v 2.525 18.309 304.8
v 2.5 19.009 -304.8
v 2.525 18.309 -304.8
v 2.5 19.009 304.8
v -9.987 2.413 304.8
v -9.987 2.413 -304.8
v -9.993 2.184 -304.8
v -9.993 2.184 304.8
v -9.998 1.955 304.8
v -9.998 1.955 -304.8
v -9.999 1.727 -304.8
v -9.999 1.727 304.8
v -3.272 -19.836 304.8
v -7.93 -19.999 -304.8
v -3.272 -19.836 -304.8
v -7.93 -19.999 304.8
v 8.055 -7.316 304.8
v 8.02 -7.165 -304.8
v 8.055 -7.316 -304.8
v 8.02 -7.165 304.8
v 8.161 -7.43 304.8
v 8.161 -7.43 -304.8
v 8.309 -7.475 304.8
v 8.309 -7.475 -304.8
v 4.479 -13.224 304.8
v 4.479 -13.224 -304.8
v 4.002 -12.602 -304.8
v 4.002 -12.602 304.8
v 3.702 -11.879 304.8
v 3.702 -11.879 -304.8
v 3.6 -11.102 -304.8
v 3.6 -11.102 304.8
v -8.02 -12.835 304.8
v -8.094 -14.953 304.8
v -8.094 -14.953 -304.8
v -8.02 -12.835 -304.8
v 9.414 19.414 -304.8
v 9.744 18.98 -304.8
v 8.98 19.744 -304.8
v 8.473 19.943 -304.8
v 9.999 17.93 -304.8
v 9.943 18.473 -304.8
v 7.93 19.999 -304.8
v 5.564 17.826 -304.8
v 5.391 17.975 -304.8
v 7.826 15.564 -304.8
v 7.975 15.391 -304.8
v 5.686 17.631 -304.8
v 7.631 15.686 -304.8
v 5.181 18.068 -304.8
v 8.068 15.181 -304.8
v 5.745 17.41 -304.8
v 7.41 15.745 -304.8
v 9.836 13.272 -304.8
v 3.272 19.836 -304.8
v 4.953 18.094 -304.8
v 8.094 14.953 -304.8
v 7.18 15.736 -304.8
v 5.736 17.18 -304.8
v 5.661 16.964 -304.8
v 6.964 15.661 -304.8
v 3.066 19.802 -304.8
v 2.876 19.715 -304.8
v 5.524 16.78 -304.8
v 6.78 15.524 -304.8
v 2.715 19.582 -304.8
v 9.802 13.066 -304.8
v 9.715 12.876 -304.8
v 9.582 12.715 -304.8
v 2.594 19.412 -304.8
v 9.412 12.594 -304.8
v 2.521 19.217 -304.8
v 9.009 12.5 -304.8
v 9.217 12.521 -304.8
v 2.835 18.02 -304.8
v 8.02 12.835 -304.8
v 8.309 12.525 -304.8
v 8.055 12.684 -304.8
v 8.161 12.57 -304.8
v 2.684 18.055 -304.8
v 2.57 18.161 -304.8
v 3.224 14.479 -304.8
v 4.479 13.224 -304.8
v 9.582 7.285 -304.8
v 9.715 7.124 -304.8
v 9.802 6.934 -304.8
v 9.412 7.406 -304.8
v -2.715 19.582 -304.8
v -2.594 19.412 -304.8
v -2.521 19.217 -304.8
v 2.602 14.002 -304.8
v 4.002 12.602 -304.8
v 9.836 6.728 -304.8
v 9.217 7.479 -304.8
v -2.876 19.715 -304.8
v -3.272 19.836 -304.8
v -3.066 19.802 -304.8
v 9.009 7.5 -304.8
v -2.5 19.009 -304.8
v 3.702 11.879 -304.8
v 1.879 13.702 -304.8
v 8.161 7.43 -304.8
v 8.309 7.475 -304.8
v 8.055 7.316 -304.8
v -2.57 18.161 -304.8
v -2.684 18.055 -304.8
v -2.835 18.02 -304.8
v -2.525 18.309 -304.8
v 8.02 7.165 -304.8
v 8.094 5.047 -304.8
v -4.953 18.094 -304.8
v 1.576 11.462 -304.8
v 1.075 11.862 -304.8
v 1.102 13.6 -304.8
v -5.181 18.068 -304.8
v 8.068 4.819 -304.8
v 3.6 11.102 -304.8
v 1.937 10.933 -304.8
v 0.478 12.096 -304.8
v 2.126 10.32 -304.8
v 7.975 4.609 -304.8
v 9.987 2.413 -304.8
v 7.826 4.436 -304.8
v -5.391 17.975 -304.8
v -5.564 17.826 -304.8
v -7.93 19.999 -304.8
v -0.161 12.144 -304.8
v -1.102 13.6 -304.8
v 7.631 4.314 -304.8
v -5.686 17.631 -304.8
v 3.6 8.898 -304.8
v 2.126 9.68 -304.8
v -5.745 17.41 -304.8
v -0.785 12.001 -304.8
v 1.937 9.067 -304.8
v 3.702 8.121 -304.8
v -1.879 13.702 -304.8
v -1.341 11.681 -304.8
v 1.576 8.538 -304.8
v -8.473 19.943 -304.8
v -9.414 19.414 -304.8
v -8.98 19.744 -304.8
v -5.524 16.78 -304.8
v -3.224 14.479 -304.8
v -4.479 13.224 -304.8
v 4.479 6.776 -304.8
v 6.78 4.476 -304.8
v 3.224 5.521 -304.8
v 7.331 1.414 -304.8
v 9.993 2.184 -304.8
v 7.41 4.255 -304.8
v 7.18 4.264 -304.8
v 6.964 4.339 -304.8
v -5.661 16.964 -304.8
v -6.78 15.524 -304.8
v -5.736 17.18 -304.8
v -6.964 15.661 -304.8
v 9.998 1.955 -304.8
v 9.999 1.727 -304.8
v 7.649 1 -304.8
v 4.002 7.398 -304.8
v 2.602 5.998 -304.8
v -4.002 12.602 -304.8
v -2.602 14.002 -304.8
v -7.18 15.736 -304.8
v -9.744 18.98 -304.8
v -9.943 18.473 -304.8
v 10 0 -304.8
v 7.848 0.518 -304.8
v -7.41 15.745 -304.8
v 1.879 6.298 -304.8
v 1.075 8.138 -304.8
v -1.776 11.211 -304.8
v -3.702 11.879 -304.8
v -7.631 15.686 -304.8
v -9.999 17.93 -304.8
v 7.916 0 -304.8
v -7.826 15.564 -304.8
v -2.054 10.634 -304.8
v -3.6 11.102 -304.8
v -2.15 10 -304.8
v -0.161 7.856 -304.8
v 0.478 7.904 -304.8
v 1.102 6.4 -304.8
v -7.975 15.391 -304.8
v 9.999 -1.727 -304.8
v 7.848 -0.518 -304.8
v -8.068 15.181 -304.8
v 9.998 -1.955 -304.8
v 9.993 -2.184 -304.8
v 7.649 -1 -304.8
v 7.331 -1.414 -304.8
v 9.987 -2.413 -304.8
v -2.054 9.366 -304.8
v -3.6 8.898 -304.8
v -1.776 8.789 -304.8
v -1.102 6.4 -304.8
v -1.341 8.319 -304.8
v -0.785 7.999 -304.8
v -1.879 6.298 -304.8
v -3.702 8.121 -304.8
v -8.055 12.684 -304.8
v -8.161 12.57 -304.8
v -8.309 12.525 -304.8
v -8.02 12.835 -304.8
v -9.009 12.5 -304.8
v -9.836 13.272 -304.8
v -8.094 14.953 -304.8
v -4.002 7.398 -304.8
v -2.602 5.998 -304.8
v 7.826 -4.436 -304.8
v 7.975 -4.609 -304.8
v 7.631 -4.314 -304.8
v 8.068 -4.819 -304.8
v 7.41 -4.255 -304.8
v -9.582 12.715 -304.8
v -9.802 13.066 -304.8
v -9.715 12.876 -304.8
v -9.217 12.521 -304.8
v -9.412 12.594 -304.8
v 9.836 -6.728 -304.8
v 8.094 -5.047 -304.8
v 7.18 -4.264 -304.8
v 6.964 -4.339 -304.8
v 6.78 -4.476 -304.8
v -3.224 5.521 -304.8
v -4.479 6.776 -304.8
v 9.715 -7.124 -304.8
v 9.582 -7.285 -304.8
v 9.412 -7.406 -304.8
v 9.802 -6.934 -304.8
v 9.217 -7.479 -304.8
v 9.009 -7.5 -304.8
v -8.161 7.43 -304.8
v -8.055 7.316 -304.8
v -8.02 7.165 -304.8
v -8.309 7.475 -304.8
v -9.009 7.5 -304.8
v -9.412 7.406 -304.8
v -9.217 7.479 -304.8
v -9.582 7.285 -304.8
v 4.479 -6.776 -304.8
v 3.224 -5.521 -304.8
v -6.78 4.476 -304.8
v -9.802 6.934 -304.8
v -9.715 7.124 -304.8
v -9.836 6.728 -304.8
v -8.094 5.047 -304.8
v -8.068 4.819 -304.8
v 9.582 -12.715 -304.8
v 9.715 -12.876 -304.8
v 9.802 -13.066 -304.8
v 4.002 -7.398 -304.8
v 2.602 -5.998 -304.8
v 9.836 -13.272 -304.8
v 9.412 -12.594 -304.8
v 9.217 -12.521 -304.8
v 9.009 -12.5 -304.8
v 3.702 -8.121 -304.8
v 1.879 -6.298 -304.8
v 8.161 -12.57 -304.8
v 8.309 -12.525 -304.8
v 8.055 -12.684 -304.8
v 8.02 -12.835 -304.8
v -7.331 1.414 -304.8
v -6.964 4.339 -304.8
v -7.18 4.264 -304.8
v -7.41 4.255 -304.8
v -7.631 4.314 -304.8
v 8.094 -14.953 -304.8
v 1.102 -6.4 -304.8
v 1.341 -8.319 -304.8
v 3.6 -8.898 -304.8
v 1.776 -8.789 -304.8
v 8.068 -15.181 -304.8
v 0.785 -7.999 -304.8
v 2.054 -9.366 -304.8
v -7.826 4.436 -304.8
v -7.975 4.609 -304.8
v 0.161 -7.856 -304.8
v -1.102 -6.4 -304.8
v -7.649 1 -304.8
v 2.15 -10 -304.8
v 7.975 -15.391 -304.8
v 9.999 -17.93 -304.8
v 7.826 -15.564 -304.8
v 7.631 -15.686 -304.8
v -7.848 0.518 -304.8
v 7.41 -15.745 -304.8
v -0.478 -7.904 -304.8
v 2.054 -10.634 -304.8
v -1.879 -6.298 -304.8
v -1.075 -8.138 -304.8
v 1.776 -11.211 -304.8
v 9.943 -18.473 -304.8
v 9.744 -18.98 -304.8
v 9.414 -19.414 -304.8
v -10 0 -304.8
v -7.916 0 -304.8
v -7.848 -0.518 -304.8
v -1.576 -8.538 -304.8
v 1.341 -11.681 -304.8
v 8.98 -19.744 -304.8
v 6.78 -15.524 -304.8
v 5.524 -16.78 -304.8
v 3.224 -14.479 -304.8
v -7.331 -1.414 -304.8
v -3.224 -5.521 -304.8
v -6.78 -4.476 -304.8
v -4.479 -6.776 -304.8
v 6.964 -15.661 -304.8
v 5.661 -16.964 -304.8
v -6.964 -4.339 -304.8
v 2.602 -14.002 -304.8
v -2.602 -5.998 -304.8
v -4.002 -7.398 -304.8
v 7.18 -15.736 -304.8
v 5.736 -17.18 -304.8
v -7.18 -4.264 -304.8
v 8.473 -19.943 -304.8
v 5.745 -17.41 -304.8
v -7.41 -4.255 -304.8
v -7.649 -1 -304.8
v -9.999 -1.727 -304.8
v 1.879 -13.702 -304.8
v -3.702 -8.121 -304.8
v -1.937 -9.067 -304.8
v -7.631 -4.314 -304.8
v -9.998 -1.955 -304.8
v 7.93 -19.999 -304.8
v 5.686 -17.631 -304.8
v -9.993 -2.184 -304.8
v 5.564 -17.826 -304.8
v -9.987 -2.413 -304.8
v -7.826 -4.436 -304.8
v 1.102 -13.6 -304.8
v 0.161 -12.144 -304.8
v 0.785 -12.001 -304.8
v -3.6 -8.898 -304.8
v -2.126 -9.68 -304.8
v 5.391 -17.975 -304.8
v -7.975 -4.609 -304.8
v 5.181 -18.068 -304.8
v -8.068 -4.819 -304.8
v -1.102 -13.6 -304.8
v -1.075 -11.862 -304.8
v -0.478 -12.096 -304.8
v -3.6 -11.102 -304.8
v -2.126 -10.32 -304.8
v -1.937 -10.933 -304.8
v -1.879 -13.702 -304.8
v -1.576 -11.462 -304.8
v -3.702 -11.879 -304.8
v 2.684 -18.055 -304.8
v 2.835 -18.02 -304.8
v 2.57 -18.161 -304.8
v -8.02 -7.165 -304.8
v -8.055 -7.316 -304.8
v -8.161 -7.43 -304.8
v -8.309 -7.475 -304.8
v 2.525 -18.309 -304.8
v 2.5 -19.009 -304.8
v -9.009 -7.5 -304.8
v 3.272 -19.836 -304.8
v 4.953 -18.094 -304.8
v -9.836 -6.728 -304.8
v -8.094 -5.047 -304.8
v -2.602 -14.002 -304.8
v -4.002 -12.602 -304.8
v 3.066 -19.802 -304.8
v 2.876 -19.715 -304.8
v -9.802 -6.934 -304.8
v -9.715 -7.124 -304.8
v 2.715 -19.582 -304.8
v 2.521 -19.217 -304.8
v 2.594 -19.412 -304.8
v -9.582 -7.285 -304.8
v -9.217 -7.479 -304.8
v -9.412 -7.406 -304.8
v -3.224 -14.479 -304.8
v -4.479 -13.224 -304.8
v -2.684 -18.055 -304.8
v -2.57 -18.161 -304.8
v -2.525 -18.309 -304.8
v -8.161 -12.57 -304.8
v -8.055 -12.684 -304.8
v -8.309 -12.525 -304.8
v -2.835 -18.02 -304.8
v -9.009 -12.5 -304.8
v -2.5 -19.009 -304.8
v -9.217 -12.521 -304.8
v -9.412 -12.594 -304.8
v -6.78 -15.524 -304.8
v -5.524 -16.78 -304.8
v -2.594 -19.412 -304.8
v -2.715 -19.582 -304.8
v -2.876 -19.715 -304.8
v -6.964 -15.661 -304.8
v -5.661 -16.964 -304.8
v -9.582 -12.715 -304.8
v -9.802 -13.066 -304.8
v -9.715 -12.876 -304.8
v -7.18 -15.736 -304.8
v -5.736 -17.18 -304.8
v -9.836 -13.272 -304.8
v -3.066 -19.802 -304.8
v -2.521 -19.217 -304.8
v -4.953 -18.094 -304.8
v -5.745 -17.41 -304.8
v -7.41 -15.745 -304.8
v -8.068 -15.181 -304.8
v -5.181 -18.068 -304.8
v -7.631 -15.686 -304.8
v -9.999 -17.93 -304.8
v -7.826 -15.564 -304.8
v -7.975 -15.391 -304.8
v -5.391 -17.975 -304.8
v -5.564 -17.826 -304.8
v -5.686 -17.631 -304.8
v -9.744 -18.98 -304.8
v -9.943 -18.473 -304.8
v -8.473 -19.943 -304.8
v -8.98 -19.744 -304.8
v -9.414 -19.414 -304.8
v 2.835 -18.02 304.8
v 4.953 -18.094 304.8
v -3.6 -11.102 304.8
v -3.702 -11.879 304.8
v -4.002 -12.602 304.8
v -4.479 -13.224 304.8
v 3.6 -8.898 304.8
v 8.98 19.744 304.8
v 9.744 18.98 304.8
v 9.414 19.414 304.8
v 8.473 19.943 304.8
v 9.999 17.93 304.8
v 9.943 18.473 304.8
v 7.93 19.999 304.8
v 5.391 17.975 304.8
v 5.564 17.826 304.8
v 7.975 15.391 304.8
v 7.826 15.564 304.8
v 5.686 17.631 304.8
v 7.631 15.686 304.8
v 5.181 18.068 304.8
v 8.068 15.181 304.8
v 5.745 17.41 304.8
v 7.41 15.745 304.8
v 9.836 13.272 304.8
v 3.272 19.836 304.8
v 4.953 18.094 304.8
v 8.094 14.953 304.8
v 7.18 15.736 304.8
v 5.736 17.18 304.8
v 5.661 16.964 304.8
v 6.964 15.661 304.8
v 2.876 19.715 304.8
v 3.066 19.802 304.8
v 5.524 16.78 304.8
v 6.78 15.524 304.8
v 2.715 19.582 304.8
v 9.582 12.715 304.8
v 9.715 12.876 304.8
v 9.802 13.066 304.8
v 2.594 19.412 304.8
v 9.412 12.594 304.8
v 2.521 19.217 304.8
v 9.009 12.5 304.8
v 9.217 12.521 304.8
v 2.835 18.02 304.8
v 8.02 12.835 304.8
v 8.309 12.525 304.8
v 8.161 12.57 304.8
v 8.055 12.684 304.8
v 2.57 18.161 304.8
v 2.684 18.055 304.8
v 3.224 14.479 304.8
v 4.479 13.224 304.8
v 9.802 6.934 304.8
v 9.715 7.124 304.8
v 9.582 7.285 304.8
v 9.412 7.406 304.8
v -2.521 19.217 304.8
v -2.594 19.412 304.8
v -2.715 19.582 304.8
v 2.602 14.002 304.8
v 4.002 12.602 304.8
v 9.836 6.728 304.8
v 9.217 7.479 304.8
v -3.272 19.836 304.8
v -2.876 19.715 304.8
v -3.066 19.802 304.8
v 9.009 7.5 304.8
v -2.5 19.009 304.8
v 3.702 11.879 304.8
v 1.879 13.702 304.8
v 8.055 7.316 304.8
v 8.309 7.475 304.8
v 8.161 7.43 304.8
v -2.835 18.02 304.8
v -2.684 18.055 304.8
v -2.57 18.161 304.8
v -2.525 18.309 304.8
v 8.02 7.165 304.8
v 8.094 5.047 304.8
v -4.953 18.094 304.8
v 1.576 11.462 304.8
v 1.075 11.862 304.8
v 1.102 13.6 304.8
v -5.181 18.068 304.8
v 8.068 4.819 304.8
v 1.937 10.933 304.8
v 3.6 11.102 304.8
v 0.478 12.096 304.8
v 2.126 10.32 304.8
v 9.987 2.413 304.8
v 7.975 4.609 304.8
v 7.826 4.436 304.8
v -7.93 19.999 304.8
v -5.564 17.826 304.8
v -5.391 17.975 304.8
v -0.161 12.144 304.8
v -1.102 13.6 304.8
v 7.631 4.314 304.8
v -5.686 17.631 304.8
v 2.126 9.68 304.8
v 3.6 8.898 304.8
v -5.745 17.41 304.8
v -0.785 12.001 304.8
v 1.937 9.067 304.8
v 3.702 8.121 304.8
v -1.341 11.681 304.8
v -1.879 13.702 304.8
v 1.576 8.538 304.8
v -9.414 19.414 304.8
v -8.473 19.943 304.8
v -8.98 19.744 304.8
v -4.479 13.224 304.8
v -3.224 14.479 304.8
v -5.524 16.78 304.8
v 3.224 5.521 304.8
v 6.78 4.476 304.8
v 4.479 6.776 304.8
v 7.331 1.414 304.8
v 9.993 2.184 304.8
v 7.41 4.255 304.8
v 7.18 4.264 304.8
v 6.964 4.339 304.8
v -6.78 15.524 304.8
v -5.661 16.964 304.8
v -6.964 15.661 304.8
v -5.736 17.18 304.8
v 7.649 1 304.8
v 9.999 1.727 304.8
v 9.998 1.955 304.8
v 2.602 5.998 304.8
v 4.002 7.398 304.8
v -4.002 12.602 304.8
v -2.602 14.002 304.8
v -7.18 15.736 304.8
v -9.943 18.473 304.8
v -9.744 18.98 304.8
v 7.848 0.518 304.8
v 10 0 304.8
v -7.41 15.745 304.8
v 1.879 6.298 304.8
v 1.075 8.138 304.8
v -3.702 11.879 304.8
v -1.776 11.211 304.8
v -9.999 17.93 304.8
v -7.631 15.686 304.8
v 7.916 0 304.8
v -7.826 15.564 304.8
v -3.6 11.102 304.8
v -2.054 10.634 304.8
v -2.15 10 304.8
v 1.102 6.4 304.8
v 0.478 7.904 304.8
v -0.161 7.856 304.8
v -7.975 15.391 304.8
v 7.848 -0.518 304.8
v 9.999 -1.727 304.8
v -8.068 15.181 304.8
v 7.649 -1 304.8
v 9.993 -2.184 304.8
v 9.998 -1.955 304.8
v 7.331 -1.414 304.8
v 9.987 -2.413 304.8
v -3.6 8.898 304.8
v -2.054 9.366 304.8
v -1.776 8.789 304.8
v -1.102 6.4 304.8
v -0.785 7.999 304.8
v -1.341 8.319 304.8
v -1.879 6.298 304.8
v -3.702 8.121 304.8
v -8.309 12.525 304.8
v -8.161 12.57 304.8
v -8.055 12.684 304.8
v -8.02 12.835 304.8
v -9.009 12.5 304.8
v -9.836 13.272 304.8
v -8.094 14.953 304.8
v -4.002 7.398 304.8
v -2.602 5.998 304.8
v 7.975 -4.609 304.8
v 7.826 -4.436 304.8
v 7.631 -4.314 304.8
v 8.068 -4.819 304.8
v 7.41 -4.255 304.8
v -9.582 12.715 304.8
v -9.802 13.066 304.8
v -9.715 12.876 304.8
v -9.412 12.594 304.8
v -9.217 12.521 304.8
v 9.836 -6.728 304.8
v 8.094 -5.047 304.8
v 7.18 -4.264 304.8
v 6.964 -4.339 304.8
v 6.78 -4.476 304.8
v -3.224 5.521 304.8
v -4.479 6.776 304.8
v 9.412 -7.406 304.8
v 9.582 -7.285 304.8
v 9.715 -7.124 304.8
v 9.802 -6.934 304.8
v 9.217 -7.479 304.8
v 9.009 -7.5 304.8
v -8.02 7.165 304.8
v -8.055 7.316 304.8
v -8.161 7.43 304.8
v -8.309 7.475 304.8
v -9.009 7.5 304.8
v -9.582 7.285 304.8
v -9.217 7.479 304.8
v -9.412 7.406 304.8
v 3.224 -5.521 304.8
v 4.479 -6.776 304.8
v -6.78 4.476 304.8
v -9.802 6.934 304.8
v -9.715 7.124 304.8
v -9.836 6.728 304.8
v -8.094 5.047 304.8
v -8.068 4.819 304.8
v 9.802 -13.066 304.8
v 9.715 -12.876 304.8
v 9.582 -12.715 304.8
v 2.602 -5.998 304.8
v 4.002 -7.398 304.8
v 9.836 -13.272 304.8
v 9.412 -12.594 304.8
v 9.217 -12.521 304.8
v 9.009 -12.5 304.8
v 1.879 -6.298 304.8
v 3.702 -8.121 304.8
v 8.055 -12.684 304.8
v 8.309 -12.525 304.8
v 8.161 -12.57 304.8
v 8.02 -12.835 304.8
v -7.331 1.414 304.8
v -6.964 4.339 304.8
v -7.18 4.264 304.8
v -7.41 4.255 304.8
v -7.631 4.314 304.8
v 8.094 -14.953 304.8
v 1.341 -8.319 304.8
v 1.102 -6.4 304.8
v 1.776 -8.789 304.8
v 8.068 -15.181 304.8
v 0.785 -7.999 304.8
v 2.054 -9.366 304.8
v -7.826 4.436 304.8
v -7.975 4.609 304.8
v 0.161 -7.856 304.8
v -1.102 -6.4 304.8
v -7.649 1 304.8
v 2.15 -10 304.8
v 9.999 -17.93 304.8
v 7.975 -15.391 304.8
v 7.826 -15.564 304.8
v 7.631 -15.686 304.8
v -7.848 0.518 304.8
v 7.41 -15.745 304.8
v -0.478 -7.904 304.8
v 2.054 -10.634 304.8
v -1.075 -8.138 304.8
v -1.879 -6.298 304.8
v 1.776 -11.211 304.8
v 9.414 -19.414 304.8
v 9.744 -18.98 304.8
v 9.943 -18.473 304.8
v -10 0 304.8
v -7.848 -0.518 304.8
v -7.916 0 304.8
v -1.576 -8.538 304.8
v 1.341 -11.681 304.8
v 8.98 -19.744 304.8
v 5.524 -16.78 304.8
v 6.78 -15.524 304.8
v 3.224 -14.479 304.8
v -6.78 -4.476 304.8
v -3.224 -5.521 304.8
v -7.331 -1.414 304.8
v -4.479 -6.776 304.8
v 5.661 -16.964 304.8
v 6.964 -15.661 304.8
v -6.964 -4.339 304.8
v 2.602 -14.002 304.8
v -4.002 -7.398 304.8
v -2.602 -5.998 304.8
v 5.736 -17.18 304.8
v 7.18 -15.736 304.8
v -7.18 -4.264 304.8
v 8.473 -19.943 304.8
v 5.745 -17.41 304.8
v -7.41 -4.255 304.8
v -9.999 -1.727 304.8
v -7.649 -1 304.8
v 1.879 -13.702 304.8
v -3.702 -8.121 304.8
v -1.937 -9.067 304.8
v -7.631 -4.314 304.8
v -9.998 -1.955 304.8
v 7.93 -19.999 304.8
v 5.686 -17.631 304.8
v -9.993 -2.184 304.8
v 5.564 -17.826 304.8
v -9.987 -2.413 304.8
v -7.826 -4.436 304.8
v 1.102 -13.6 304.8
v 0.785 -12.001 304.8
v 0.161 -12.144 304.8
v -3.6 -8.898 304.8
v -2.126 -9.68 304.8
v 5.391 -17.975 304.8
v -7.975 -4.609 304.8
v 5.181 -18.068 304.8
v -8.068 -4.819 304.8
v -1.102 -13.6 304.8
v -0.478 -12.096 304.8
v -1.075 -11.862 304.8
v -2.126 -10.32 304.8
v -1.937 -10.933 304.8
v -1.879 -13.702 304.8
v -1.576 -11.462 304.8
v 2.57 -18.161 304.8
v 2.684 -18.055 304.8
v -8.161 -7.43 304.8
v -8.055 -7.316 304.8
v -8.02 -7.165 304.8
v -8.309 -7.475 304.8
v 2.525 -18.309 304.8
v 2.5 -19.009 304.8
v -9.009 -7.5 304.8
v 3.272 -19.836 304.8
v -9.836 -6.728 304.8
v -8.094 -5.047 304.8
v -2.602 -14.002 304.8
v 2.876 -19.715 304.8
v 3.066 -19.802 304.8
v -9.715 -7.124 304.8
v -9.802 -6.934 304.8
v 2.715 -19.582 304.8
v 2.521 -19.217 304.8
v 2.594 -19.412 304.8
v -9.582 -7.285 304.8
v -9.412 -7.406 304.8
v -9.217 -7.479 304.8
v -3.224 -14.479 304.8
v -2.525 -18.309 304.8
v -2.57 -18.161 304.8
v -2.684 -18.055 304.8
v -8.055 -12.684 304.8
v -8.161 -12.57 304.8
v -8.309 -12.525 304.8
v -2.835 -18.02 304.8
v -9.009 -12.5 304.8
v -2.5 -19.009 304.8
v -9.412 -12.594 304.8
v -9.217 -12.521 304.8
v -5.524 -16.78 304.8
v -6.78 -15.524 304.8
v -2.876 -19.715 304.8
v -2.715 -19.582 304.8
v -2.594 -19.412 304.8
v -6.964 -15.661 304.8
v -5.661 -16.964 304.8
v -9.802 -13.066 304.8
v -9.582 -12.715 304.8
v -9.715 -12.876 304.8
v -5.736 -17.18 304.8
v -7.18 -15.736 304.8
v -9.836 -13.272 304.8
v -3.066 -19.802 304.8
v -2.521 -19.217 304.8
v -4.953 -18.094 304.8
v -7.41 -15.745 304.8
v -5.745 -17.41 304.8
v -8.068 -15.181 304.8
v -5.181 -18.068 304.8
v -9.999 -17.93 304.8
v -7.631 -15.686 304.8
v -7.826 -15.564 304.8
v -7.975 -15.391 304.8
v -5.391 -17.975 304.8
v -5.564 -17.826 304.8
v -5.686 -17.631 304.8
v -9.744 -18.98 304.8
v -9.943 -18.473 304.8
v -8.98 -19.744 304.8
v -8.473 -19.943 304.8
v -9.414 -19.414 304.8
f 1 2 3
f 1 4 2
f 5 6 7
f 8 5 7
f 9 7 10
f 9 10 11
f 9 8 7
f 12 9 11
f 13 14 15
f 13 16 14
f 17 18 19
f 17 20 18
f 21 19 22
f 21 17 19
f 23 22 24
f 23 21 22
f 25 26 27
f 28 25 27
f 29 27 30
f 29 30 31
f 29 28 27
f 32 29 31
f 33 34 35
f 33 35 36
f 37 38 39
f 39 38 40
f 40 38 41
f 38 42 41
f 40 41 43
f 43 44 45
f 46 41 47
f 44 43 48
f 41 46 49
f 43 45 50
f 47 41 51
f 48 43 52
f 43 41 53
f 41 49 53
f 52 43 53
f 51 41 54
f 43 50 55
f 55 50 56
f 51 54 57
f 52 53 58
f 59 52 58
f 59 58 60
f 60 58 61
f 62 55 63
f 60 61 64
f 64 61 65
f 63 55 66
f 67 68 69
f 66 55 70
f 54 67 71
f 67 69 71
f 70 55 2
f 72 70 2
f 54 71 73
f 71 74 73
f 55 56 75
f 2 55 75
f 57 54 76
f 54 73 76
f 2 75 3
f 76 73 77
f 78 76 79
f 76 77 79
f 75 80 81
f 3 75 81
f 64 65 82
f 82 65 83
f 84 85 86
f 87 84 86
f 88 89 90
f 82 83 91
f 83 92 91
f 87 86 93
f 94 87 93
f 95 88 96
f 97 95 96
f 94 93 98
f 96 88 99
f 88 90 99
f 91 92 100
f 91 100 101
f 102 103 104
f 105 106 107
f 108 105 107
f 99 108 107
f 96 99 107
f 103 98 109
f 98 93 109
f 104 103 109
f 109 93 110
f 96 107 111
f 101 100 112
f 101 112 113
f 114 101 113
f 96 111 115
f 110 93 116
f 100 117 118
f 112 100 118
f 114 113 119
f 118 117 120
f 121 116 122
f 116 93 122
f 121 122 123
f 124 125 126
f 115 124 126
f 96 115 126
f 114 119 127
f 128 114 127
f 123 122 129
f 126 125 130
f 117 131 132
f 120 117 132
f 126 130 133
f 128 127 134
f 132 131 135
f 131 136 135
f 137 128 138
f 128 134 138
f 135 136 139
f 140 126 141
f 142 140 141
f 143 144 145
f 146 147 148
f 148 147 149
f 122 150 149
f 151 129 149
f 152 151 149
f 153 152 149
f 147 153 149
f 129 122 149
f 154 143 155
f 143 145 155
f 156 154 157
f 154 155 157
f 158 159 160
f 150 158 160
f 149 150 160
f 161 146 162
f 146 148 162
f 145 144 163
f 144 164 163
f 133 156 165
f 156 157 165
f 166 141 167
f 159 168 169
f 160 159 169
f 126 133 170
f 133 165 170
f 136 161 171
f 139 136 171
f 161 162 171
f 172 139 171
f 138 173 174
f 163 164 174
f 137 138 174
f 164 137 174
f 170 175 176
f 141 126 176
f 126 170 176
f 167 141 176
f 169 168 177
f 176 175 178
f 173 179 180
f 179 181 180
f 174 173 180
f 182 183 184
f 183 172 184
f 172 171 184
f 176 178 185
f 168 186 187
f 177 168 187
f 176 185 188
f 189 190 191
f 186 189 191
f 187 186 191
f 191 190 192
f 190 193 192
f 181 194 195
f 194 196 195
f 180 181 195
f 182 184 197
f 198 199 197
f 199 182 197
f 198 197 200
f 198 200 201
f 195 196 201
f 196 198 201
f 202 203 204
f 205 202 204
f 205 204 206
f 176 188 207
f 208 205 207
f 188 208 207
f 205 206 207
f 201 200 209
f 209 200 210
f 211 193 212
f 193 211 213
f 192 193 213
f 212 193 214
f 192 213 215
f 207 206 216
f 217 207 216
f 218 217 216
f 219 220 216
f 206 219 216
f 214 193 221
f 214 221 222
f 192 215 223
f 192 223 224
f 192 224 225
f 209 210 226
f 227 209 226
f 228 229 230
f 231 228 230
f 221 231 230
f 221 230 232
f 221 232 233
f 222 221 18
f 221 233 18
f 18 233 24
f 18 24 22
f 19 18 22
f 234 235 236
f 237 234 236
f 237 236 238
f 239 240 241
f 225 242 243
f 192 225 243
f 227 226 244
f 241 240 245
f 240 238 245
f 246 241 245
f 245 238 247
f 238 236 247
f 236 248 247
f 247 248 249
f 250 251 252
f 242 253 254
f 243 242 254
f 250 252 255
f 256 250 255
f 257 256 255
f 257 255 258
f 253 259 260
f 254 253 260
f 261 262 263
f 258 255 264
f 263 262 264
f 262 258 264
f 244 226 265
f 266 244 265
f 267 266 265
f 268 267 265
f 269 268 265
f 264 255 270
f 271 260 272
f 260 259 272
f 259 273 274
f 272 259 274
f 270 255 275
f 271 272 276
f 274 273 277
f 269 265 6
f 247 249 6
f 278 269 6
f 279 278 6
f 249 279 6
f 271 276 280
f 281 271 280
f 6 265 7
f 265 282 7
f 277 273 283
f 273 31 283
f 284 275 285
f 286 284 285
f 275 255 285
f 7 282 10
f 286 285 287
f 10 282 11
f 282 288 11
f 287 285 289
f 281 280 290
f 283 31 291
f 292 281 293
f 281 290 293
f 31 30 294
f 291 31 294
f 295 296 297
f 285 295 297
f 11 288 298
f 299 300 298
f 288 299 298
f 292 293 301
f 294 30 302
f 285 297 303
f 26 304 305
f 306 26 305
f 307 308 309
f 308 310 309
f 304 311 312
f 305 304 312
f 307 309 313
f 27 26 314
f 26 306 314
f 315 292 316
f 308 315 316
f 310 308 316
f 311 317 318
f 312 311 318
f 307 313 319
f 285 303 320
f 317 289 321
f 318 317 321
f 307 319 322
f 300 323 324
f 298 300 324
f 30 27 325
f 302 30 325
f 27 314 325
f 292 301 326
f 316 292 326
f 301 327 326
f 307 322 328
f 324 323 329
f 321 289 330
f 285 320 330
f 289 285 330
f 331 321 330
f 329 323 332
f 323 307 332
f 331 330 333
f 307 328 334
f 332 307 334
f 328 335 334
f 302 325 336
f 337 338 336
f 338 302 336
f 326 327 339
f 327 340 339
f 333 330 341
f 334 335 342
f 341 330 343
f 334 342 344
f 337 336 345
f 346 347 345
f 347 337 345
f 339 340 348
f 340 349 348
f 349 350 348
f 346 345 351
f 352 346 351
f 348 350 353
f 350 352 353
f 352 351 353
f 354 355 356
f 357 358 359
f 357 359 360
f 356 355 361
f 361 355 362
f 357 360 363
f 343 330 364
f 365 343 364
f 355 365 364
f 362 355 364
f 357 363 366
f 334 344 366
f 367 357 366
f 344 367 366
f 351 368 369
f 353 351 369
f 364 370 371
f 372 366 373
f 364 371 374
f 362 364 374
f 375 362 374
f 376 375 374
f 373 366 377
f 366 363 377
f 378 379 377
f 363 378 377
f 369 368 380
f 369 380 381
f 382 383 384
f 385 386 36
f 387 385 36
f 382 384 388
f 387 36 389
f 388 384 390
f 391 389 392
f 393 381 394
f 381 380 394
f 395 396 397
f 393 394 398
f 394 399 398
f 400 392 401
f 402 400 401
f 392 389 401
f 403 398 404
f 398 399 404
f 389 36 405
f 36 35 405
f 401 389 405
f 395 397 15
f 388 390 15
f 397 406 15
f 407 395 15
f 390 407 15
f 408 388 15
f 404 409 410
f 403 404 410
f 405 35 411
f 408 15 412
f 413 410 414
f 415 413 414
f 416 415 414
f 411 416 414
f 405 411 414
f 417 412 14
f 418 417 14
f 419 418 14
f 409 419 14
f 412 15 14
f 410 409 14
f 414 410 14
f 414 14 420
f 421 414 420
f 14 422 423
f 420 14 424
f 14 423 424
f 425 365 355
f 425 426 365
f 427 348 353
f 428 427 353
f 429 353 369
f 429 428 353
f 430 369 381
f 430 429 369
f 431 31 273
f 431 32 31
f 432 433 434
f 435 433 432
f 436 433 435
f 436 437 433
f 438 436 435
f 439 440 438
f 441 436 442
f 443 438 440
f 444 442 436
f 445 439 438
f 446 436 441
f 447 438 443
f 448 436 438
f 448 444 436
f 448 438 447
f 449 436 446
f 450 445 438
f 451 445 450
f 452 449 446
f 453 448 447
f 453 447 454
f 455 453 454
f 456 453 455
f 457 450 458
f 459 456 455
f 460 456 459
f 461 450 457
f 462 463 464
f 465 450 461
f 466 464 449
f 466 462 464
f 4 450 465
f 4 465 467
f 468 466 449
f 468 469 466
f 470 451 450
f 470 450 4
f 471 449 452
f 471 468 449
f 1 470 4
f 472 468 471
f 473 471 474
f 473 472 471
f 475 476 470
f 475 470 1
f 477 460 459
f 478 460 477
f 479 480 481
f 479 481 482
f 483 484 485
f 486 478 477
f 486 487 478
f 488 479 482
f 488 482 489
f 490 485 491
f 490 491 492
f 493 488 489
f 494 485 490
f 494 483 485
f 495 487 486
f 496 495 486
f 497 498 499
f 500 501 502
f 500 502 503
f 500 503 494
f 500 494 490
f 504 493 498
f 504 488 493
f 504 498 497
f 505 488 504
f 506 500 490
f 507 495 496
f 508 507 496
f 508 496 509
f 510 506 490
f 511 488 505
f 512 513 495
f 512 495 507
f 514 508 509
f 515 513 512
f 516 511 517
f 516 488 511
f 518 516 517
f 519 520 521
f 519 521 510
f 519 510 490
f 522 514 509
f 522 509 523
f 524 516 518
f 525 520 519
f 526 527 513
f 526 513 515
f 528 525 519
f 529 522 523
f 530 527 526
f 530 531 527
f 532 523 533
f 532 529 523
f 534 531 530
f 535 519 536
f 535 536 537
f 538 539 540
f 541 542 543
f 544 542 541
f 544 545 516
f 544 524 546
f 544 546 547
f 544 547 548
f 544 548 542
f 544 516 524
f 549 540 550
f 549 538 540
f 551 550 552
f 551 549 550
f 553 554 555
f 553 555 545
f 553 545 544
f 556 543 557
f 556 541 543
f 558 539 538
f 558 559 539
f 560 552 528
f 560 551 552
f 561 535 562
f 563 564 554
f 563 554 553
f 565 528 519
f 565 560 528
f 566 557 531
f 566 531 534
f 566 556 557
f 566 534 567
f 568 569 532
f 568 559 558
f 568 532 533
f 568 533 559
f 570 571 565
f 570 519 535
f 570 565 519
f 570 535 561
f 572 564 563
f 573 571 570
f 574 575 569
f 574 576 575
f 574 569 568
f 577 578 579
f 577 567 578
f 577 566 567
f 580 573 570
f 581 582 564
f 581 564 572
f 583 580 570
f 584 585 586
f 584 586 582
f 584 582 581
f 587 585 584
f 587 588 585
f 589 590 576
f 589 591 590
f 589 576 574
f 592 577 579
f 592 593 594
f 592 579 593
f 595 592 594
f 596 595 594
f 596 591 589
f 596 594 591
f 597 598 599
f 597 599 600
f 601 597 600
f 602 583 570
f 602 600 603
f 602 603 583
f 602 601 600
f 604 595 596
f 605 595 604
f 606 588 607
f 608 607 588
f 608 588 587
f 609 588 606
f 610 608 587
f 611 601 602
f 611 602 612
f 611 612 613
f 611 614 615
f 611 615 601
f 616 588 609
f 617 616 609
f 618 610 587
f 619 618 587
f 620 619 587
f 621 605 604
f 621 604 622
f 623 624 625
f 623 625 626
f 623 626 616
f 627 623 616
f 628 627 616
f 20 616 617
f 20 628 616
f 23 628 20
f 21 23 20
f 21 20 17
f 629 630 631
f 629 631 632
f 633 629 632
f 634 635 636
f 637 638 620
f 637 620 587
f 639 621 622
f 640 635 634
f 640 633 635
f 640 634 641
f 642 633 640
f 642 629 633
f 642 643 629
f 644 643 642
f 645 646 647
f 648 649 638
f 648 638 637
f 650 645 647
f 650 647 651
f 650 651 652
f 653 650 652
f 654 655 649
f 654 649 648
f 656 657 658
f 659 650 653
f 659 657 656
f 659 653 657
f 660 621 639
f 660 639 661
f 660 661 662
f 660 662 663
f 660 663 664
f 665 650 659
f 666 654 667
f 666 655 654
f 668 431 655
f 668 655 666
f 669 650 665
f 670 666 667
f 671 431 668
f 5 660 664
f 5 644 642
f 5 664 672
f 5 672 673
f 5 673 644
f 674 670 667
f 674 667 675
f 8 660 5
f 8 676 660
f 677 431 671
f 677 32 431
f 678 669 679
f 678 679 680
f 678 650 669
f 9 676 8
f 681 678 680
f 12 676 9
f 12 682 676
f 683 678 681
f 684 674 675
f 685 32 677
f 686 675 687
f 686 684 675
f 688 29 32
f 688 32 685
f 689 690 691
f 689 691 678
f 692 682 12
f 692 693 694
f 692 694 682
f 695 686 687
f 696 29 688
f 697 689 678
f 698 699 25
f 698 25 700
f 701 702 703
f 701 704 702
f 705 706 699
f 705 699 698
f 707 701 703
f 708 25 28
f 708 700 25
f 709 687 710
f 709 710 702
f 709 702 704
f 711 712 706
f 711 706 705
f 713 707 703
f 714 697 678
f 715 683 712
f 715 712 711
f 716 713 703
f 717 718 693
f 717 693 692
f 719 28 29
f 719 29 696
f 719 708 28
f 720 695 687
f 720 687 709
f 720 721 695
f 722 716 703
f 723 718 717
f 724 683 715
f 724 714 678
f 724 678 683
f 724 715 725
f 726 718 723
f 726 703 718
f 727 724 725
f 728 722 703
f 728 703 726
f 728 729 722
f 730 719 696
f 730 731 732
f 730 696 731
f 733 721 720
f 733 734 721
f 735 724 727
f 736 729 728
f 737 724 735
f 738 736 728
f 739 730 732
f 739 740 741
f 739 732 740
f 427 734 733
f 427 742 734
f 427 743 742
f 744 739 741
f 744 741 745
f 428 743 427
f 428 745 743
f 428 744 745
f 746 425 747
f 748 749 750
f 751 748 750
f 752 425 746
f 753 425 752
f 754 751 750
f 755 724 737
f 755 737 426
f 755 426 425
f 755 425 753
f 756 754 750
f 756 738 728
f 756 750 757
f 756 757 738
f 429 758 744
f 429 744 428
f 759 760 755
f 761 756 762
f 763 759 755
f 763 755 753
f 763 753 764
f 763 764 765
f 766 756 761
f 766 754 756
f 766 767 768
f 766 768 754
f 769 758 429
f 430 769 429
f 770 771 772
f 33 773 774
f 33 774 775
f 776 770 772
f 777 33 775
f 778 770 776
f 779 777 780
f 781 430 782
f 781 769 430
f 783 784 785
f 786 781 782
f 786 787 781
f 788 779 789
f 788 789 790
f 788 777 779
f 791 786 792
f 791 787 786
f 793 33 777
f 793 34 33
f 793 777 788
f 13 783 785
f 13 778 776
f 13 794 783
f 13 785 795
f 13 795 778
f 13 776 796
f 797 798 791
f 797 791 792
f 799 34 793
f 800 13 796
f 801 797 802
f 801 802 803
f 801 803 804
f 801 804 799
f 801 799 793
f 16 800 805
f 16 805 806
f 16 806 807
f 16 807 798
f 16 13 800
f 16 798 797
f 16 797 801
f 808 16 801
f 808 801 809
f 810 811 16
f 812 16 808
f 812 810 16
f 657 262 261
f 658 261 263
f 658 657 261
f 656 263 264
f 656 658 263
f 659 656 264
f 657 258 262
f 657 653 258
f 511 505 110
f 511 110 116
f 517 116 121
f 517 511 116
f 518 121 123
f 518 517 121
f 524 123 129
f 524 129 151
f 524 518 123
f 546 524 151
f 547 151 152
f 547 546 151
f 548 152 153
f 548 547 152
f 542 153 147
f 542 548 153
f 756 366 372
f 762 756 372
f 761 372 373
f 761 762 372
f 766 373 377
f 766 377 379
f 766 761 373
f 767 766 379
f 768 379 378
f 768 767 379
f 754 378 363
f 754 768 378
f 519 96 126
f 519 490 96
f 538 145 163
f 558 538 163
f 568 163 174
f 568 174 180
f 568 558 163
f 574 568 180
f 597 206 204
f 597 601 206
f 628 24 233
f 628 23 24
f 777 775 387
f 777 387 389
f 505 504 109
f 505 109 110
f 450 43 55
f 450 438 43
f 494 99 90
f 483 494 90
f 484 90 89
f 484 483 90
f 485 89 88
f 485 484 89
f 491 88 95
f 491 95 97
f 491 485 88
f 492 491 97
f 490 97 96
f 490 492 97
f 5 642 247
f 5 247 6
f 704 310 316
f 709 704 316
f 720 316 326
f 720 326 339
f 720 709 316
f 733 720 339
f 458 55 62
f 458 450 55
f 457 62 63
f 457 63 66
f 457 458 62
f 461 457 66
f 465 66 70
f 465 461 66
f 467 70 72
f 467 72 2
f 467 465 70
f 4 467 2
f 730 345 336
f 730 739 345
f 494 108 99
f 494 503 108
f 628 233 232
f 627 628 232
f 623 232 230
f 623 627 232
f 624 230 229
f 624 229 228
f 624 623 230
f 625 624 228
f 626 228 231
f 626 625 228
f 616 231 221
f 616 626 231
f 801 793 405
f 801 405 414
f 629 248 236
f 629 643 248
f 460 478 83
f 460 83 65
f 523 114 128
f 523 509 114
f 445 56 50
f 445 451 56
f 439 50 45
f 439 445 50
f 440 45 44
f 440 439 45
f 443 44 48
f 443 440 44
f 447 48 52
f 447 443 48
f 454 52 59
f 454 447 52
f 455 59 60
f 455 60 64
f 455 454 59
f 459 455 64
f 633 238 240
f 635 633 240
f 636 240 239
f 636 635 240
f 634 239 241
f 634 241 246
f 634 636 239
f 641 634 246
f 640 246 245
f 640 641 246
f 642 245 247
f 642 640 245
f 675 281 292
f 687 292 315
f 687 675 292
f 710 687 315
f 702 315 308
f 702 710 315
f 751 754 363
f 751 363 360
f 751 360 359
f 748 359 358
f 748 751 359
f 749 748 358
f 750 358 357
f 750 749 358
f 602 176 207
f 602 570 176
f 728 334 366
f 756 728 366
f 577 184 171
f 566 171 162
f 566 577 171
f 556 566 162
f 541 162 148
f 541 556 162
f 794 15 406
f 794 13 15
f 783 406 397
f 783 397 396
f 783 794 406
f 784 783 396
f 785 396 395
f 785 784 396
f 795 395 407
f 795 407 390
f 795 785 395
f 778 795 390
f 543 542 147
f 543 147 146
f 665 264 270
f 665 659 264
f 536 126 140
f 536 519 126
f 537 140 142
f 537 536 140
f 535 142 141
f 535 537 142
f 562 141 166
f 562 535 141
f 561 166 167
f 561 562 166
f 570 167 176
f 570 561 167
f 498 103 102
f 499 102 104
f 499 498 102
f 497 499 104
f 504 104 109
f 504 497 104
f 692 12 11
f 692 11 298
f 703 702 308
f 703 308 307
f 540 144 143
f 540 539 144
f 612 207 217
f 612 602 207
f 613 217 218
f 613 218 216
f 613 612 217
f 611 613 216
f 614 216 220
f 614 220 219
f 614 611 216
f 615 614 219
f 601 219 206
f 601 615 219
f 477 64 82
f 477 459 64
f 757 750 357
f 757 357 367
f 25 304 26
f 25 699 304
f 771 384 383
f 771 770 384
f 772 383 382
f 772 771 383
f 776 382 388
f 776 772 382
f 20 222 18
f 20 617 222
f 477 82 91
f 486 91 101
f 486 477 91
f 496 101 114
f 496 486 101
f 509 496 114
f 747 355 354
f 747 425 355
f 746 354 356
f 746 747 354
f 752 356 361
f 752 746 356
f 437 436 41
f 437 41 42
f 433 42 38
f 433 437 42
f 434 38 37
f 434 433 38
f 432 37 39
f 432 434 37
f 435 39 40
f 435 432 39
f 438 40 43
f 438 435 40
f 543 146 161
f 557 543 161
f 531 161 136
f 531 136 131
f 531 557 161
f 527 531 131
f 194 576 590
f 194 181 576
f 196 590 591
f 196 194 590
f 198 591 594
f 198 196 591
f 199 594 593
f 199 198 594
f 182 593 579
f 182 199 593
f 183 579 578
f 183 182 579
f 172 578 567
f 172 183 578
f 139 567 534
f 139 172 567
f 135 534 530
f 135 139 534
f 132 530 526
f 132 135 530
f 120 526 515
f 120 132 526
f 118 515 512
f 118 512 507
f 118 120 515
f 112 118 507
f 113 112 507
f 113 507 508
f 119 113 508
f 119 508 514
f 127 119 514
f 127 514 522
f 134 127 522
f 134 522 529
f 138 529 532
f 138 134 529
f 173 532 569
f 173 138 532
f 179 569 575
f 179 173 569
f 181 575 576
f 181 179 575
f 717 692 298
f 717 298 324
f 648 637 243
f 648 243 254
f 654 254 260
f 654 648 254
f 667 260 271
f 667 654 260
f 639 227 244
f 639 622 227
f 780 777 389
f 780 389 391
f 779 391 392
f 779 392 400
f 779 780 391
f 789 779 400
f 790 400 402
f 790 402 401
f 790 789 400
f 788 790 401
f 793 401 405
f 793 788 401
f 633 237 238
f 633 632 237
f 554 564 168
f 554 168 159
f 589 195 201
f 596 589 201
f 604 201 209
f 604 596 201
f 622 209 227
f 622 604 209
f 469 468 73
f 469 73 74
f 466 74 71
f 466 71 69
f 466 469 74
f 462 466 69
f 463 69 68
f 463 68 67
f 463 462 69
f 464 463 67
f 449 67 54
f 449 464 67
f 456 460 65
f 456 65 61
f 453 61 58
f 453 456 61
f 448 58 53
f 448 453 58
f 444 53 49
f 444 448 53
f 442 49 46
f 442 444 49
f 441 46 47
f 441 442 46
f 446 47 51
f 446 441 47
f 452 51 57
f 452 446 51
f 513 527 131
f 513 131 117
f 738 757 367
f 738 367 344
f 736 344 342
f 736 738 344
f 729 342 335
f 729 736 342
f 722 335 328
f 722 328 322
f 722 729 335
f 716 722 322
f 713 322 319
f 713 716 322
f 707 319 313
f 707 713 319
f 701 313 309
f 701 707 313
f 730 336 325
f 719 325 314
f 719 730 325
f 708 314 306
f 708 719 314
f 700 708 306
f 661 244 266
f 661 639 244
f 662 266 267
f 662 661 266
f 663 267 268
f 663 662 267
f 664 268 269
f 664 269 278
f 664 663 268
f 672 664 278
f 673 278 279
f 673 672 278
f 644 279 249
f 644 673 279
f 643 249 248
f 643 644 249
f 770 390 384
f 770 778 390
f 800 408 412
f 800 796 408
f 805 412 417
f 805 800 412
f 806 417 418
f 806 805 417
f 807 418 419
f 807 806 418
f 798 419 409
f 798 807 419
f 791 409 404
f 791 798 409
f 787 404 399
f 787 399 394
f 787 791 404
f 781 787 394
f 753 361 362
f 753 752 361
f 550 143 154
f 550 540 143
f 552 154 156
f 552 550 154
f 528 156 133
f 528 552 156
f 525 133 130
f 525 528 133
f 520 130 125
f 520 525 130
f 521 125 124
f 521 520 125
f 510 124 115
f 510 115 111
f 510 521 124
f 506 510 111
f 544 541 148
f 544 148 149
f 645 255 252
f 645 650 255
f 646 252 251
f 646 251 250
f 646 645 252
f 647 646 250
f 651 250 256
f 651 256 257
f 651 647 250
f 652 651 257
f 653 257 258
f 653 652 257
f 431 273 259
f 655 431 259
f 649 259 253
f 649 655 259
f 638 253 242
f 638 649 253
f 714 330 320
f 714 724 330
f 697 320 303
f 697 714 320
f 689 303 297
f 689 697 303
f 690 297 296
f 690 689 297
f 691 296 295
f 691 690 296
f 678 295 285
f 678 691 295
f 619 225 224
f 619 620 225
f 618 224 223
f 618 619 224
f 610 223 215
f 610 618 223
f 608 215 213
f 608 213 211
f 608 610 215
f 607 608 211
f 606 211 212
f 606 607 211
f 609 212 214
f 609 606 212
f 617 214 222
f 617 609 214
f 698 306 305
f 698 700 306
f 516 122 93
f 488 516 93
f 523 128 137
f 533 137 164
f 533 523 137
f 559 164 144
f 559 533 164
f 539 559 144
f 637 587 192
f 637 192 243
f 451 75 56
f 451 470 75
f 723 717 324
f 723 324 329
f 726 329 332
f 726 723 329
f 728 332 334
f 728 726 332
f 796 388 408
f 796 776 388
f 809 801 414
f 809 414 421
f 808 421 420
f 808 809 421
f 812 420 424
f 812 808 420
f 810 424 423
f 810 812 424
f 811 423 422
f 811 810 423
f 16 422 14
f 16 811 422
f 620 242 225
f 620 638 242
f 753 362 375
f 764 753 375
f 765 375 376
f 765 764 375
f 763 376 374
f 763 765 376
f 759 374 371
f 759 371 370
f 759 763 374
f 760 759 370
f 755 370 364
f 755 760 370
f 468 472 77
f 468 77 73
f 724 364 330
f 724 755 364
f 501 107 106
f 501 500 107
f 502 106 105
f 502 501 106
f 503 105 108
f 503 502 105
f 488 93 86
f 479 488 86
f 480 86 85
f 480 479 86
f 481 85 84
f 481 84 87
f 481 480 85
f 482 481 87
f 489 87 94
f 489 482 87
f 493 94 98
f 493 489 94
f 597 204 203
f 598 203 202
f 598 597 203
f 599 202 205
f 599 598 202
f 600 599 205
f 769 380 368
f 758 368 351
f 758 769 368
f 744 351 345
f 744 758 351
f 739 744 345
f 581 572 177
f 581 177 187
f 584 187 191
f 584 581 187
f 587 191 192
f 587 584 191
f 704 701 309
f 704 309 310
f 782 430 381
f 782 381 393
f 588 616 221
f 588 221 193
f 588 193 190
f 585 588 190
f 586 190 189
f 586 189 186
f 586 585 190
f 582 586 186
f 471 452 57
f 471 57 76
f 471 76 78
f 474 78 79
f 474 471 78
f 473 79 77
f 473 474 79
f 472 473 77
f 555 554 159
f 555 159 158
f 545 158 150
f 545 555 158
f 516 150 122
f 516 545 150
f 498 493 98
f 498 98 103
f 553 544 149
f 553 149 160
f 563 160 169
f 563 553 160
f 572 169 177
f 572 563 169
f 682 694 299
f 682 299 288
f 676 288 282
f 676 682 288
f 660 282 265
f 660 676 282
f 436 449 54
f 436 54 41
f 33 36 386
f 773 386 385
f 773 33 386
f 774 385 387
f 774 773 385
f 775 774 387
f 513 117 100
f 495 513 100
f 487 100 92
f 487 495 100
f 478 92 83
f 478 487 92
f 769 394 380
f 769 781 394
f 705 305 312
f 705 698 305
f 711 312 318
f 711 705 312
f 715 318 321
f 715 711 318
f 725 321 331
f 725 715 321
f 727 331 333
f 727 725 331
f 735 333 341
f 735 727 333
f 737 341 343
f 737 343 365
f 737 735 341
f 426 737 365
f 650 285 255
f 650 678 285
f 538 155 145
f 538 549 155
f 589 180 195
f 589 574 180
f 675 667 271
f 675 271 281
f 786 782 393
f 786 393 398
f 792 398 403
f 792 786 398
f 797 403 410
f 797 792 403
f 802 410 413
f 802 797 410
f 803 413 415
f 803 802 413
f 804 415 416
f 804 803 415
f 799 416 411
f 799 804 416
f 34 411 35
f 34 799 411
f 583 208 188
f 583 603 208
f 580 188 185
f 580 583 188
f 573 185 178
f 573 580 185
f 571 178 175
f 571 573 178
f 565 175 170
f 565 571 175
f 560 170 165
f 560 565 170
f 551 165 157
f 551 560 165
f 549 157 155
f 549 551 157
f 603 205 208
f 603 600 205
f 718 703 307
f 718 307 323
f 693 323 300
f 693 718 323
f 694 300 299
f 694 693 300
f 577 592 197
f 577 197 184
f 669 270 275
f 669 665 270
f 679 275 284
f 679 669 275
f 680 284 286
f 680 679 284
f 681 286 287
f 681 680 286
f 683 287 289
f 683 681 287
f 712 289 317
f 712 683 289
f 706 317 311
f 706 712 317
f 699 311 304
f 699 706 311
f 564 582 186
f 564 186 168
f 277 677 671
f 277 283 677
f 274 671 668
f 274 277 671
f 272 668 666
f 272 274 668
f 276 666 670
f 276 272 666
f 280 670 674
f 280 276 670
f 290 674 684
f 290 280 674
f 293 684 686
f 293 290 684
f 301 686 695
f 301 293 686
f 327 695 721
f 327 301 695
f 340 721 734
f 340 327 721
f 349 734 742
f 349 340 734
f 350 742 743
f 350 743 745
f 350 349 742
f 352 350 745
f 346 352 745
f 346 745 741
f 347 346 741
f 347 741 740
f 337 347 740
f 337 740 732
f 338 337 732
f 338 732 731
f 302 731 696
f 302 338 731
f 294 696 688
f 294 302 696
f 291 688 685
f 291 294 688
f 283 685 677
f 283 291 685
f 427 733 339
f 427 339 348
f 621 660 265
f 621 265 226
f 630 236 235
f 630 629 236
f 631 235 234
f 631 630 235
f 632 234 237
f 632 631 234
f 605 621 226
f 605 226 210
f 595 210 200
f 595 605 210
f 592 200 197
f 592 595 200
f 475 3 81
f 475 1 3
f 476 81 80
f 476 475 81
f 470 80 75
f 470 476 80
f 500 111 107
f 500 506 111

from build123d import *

# Parameters (mm, degrees)
SKETCH3_R           = 2.15
BOSS_EXTRUDE1_DEPTH = 304.8
CIRPATTERN1_COUNT   = 2


with BuildPart() as part:
    # Sketch3 → Boss-Extrude1 (new, symmetric)
    with BuildSketch(Plane.XY):
        with BuildLine():
            Line((-8.30911066, 7.475083014), (-9.008684239, 7.499512662))
            ThreePointArc((-9.008684239, 7.499512662), (-9.582202525, 7.285082961), (-9.836116498, 6.727919597))
            Line((-9.836116498, 6.727919597), (-9.986803685, 2.412803152))
            ThreePointArc((-9.986803685, 2.412803152), (-9.995837451, 2.069746735), (-9.99898368, 1.726585818))
            Line((-9.99898368, 1.726585818), (-10, 0))
            Line((-10, 0), (-7.916458339, 0))
            ThreePointArc((-7.916458339, 0), (-7.764217404, 0.765366865), (-7.330671901, 1.414213562))
            Line((-7.330671901, 1.414213562), (-3.22356512, 5.521320344))
            ThreePointArc((-3.22356512, 5.521320344), (-2.250295073, 6.171638598), (-1.102244776, 6.4))
            Line((-1.102244776, 6.4), (1.102244776, 6.4))
            ThreePointArc((1.102244776, 6.4), (2.250295073, 6.171638598), (3.22356512, 5.521320344))
            Line((3.22356512, 5.521320344), (7.330671901, 1.414213562))
            ThreePointArc((7.330671901, 1.414213562), (7.764217404, 0.765366865), (7.916458339, 0))
            Line((7.916458339, 0), (10, 0))
            Line((10, 0), (9.99898368, 1.726585818))
            ThreePointArc((9.99898368, 1.726585818), (9.995837451, 2.069746735), (9.986803685, 2.412803152))
            Line((9.986803685, 2.412803152), (9.836116498, 6.727919597))
            ThreePointArc((9.836116498, 6.727919597), (9.582202525, 7.285082961), (9.008684239, 7.499512662))
            Line((9.008684239, 7.499512662), (8.30911066, 7.475083014))
            ThreePointArc((8.30911066, 7.475083014), (8.100174399, 7.379865274), (8.019763261, 7.164795917))
            Line((8.019763261, 7.164795917), (8.093719461, 5.046967452))
            ThreePointArc((8.093719461, 5.046967452), (7.631170264, 4.313871343), (6.779559917, 4.47555462))
            Line((6.779559917, 4.47555462), (4.478679656, 6.77643488))
            ThreePointArc((4.478679656, 6.77643488), (3.828361402, 7.749704927), (3.6, 8.897755224))
            Line((3.6, 8.897755224), (3.6, 11.102244776))
            ThreePointArc((3.6, 11.102244776), (3.828361402, 12.250295073), (4.478679656, 13.22356512))
            Line((4.478679656, 13.22356512), (6.779559917, 15.52444538))
            ThreePointArc((6.779559917, 15.52444538), (7.631170264, 15.686128657), (8.093719461, 14.953032548))
            Line((8.093719461, 14.953032548), (8.019763261, 12.835204083))
            ThreePointArc((8.019763261, 12.835204083), (8.100174399, 12.620134726), (8.30911066, 12.524916986))
            Line((8.30911066, 12.524916986), (9.008684239, 12.500487338))
            ThreePointArc((9.008684239, 12.500487338), (9.582202525, 12.714917039), (9.836116498, 13.272080403))
            Line((9.836116498, 13.272080403), (9.998781654, 17.930201007))
            ThreePointArc((9.998781654, 17.930201007), (9.414213562, 19.414213562), (7.930201007, 19.998781654))
            Line((7.930201007, 19.998781654), (3.272080403, 19.836116498))
            ThreePointArc((3.272080403, 19.836116498), (2.714917039, 19.582202525), (2.500487338, 19.008684239))
            Line((2.500487338, 19.008684239), (2.524916986, 18.30911066))
            ThreePointArc((2.524916986, 18.30911066), (2.620134726, 18.100174399), (2.835204083, 18.019763261))
            Line((2.835204083, 18.019763261), (4.953032548, 18.093719461))
            ThreePointArc((4.953032548, 18.093719461), (5.686128657, 17.631170264), (5.52444538, 16.779559917))
            Line((5.52444538, 16.779559917), (3.22356512, 14.478679656))
            ThreePointArc((3.22356512, 14.478679656), (2.250295073, 13.828361402), (1.102244776, 13.6))
            Line((1.102244776, 13.6), (-1.102244776, 13.6))
            ThreePointArc((-1.102244776, 13.6), (-2.250295073, 13.828361402), (-3.22356512, 14.478679656))
            Line((-3.22356512, 14.478679656), (-5.52444538, 16.779559917))
            ThreePointArc((-5.52444538, 16.779559917), (-5.686128657, 17.631170264), (-4.953032548, 18.093719461))
            Line((-4.953032548, 18.093719461), (-2.835204083, 18.019763261))
            ThreePointArc((-2.835204083, 18.019763261), (-2.620134726, 18.100174399), (-2.524916986, 18.30911066))
            Line((-2.524916986, 18.30911066), (-2.500487338, 19.008684239))
            ThreePointArc((-2.500487338, 19.008684239), (-2.714917039, 19.582202525), (-3.272080403, 19.836116498))
            Line((-3.272080403, 19.836116498), (-7.930201007, 19.998781654))
            ThreePointArc((-7.930201007, 19.998781654), (-9.414213562, 19.414213562), (-9.998781654, 17.930201007))
            Line((-9.998781654, 17.930201007), (-9.836116498, 13.272080403))
            ThreePointArc((-9.836116498, 13.272080403), (-9.582202525, 12.714917039), (-9.008684239, 12.500487338))
            Line((-9.008684239, 12.500487338), (-8.30911066, 12.524916986))
            ThreePointArc((-8.30911066, 12.524916986), (-8.100174399, 12.620134726), (-8.019763261, 12.835204083))
            Line((-8.019763261, 12.835204083), (-8.093719461, 14.953032548))
            ThreePointArc((-8.093719461, 14.953032548), (-7.631170264, 15.686128657), (-6.779559917, 15.52444538))
            Line((-6.779559917, 15.52444538), (-4.478679656, 13.22356512))
            ThreePointArc((-4.478679656, 13.22356512), (-3.828361402, 12.250295073), (-3.6, 11.102244776))
            Line((-3.6, 11.102244776), (-3.6, 8.897755224))
            ThreePointArc((-3.6, 8.897755224), (-3.828361402, 7.749704927), (-4.478679656, 6.77643488))
            Line((-4.478679656, 6.77643488), (-6.779559917, 4.47555462))
            ThreePointArc((-6.779559917, 4.47555462), (-7.631170264, 4.313871343), (-8.093719461, 5.046967452))
            Line((-8.093719461, 5.046967452), (-8.019763261, 7.164795917))
            ThreePointArc((-8.019763261, 7.164795917), (-8.100174399, 7.379865274), (-8.30911066, 7.475083014))
        make_face()
        with Locations(Location((0, 10, 0), (0, 0, 180))):
            Circle(SKETCH3_R, mode=Mode.SUBTRACT)
    boss_extrude1 = extrude(amount=BOSS_EXTRUDE1_DEPTH, both=True)

    # CirPattern1: Boss-Extrude1 ×2 about axis
    cirpattern1_axis = Axis((0, 0, 0), (0, 0, 1))
    for i in range(1, CIRPATTERN1_COUNT):
        add(boss_extrude1.rotate(cirpattern1_axis, i * 360 / CIRPATTERN1_COUNT))


solid = part.part
